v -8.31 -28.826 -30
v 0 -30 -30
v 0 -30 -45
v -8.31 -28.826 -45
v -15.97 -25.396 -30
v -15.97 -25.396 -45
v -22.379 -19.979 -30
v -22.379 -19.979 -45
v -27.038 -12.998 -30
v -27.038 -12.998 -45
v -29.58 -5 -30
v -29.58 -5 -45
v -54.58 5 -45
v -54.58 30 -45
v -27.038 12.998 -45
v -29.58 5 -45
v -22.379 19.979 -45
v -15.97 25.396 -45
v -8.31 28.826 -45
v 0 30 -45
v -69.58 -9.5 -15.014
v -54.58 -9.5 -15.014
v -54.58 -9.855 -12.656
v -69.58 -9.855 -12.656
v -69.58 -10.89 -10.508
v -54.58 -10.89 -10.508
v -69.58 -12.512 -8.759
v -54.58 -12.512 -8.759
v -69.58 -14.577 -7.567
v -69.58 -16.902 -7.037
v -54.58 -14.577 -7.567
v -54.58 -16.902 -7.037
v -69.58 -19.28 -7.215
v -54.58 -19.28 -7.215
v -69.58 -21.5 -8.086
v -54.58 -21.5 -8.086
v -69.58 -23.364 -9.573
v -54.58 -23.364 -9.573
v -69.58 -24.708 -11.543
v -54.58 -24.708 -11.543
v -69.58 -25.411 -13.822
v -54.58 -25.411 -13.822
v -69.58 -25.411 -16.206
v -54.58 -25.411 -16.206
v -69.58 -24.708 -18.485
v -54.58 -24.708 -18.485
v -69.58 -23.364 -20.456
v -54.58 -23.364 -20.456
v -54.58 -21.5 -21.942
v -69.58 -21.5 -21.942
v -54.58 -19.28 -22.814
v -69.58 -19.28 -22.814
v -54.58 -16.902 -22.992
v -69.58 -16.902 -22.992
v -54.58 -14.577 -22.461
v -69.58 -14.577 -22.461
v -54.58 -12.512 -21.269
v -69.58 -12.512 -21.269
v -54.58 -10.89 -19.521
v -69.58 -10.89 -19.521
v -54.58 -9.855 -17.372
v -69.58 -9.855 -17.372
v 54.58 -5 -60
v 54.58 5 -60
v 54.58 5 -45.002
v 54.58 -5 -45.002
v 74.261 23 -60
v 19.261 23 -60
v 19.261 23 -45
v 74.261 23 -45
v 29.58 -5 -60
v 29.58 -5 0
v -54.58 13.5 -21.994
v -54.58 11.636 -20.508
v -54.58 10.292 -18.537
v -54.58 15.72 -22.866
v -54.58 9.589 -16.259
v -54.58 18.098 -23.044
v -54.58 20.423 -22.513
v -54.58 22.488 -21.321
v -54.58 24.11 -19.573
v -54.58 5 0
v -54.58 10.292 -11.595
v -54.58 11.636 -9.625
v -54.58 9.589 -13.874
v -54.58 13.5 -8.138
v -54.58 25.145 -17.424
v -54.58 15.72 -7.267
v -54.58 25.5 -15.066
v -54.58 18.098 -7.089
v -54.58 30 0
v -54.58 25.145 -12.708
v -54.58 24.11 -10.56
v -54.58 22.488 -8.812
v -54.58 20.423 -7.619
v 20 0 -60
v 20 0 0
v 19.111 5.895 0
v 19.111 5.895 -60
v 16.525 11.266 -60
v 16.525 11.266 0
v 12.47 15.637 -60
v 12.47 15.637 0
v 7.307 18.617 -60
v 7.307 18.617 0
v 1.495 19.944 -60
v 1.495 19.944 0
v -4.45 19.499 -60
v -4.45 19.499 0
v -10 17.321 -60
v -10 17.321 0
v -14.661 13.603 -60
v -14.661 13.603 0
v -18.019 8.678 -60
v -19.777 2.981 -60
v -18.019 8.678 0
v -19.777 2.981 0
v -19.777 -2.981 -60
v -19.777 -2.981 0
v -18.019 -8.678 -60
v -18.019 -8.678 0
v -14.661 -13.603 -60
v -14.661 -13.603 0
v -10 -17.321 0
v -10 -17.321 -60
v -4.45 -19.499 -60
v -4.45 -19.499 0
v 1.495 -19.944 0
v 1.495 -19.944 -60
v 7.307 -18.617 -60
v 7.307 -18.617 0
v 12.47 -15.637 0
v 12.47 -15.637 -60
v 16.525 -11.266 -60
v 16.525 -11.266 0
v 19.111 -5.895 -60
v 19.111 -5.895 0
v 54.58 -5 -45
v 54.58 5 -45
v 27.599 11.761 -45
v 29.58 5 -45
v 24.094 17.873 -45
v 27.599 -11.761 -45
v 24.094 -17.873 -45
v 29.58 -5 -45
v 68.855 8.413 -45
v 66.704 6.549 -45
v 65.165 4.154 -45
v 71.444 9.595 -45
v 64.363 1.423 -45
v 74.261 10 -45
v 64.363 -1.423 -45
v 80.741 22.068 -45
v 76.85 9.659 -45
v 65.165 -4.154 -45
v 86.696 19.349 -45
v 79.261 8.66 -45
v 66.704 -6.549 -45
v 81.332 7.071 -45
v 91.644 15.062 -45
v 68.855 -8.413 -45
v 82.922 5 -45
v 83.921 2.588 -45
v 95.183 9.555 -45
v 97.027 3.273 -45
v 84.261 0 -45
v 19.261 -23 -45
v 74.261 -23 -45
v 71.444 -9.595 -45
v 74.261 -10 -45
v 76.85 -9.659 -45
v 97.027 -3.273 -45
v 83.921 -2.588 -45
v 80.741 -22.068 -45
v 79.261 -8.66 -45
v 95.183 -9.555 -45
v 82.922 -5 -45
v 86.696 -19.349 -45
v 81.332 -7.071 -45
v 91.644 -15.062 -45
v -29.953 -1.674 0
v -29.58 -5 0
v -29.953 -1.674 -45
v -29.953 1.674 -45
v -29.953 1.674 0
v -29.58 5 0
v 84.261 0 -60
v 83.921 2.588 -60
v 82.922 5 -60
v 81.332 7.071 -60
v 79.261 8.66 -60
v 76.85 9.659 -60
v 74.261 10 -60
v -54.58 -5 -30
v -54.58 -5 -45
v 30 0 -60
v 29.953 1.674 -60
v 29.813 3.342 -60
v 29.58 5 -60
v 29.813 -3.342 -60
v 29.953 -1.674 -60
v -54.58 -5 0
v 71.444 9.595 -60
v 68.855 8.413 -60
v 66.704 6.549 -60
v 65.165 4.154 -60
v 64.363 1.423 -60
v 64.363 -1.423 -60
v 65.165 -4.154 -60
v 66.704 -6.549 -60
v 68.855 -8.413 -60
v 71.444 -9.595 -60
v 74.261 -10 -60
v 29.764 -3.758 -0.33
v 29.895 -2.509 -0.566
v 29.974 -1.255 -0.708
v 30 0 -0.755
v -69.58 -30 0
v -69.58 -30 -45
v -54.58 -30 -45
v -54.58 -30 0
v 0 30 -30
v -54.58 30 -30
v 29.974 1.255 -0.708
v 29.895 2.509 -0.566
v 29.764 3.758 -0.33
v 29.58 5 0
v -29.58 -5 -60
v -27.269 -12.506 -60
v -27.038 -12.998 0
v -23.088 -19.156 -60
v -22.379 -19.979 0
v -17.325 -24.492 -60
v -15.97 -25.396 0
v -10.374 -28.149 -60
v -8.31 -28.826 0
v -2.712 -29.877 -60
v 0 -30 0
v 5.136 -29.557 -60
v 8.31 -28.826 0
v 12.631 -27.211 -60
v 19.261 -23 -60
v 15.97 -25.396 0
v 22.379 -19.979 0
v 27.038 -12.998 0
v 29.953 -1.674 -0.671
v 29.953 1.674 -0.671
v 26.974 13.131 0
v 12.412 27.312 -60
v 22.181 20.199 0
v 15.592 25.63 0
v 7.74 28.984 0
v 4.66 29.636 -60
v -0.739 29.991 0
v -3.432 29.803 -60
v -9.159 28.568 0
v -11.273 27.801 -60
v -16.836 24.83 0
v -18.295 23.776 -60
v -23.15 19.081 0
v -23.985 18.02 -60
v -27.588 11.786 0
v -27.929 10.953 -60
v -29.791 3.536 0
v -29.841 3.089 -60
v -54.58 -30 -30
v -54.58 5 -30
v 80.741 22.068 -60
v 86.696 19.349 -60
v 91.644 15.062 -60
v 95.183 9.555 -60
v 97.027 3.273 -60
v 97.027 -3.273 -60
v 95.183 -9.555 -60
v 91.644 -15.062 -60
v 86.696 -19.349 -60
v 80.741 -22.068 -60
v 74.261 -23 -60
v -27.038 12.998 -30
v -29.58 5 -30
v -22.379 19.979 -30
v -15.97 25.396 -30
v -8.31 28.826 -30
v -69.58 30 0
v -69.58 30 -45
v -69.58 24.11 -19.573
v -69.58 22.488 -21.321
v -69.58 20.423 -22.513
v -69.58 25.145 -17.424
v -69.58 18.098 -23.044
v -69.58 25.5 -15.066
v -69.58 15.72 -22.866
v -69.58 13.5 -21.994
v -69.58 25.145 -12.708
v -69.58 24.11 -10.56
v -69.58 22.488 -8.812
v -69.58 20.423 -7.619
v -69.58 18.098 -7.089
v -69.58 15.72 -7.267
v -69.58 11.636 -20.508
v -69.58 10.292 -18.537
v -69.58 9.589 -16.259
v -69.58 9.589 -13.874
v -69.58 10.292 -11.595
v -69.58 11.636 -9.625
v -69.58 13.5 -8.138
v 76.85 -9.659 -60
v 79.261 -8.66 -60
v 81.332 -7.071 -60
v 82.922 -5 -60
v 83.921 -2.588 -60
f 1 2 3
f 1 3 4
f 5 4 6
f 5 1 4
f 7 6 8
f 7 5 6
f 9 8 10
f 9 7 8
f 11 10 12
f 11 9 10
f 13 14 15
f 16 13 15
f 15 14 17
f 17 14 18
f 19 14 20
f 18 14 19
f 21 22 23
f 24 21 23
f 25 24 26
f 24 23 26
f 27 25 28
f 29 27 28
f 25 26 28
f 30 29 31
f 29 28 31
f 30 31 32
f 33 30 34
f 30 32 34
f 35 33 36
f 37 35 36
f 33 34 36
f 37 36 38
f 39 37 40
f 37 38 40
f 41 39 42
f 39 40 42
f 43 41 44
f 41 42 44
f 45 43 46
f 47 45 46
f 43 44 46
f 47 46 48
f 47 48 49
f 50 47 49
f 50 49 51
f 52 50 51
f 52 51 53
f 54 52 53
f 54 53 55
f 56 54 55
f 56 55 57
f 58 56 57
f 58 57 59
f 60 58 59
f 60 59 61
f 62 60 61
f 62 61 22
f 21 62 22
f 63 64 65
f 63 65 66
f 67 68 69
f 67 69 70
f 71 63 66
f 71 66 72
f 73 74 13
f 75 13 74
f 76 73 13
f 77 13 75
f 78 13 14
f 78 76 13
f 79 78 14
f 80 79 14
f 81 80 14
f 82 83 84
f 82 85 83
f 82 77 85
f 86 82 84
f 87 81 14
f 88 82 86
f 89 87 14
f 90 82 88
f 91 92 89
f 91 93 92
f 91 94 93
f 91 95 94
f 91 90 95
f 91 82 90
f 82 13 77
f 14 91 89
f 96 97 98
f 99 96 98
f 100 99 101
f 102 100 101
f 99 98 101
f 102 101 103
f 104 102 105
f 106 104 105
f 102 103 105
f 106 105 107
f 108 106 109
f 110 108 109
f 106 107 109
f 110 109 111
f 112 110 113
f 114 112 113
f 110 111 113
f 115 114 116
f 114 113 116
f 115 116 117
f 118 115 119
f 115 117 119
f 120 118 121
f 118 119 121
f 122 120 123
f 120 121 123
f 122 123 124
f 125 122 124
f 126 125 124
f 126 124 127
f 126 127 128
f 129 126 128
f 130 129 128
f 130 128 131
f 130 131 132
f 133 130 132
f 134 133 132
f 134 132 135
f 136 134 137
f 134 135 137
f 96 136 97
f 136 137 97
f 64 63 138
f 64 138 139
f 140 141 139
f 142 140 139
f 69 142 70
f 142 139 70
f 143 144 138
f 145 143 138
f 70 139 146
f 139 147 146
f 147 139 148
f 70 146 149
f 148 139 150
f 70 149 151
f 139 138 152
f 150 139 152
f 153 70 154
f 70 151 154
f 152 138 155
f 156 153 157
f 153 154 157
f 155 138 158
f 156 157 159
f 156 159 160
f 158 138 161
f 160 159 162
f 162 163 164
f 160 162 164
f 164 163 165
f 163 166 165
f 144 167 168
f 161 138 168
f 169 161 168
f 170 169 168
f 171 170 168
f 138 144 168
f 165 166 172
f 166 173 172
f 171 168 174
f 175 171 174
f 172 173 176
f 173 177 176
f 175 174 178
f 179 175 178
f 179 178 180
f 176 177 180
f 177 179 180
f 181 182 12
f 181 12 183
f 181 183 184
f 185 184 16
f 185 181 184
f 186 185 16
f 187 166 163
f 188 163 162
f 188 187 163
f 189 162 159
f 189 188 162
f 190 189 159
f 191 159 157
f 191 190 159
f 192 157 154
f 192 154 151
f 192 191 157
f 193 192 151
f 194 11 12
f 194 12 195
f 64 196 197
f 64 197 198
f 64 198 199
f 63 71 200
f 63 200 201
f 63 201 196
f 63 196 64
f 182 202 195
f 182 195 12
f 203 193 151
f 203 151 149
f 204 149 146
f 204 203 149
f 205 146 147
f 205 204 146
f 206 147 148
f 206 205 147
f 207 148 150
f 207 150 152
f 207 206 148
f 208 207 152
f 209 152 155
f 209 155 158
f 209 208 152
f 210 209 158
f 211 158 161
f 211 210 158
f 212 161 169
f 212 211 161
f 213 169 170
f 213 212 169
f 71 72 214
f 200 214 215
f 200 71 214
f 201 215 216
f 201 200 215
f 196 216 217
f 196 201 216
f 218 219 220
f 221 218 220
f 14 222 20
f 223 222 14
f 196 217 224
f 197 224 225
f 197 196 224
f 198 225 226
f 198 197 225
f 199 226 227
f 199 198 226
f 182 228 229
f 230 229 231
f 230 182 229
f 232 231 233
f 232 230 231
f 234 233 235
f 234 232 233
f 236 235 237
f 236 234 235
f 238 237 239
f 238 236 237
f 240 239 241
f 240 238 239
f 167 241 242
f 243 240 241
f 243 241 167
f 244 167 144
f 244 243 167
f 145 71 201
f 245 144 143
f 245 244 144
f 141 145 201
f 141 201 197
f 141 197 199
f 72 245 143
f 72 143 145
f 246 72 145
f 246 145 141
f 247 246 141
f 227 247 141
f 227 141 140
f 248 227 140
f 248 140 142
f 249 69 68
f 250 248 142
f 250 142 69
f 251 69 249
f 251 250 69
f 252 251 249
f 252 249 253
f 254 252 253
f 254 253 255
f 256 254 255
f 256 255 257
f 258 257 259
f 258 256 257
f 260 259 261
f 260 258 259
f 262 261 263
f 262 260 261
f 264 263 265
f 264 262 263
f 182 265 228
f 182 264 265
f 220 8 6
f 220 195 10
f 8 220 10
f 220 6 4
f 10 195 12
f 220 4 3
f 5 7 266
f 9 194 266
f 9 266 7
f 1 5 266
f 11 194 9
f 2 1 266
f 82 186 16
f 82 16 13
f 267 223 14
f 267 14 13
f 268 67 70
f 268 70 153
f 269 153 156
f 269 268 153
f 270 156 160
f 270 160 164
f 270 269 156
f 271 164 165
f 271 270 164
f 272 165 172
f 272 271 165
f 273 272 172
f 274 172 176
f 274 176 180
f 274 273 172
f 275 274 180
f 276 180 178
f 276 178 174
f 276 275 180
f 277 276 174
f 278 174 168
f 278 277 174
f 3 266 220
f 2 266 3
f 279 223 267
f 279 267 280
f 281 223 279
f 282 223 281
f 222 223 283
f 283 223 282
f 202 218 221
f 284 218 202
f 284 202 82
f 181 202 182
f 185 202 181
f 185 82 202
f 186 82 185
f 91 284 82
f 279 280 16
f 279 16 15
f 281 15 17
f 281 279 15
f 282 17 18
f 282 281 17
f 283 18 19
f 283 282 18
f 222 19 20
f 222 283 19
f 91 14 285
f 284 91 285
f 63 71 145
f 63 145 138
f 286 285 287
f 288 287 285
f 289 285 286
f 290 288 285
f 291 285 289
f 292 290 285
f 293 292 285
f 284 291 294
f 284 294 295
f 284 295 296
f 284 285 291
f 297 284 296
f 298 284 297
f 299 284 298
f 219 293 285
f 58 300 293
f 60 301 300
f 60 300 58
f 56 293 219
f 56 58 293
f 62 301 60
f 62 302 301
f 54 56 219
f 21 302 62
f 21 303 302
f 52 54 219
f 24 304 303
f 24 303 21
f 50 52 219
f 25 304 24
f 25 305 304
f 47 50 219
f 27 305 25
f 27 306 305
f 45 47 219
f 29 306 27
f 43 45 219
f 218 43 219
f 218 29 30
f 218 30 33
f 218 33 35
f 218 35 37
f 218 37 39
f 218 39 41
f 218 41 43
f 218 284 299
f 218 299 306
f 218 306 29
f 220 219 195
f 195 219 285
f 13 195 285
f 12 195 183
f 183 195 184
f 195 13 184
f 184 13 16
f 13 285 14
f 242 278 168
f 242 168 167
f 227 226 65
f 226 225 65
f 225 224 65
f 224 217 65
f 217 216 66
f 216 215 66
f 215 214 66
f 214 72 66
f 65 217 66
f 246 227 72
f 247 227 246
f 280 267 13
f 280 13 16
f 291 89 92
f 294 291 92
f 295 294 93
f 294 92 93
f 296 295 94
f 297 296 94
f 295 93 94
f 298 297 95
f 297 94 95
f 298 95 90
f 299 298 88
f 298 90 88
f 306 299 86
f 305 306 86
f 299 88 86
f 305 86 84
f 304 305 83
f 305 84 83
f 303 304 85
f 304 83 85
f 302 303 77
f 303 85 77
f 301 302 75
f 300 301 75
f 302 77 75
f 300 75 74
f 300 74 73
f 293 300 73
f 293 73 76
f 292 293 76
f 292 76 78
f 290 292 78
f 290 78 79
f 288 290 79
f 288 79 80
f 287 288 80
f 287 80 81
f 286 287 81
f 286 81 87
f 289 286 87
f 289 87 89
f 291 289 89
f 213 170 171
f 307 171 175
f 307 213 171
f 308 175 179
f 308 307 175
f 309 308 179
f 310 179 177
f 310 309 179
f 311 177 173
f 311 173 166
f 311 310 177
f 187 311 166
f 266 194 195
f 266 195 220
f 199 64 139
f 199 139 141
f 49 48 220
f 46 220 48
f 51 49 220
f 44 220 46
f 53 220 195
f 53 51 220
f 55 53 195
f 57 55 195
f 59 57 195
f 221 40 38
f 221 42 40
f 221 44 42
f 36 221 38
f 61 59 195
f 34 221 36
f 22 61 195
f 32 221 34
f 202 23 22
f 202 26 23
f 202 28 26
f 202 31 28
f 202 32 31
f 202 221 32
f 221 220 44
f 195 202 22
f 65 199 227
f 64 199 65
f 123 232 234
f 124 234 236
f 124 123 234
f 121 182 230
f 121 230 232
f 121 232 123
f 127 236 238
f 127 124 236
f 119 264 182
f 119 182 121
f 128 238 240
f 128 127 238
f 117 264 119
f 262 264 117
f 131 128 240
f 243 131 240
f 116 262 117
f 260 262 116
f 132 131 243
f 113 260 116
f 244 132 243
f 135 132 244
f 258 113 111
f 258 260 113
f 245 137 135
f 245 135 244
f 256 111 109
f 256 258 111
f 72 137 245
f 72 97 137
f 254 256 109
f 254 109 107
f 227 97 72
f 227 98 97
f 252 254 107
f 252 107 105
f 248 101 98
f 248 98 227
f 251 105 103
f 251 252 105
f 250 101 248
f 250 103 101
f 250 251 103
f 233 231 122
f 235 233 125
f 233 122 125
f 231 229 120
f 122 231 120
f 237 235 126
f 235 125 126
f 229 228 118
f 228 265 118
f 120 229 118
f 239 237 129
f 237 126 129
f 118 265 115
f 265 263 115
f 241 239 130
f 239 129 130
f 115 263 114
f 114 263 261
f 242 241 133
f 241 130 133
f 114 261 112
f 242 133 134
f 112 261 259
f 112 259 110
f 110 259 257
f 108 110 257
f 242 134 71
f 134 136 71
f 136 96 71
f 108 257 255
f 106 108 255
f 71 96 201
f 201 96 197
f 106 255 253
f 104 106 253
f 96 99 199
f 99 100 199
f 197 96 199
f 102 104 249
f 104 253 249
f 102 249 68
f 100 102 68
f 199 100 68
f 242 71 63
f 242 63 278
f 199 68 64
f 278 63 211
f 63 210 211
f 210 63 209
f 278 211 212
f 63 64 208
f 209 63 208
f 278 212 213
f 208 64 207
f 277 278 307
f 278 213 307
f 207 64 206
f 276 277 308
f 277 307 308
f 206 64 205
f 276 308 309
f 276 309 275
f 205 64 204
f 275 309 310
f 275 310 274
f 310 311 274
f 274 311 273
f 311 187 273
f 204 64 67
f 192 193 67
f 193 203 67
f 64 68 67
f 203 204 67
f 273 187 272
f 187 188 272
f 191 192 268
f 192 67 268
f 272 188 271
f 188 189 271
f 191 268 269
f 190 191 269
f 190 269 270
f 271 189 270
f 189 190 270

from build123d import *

# Parameters (mm, degrees)
F0_R      = 20
F1_DEPTH  = 60
F3_DEPTH  = 45
F4_DEPTH  = 45
F6_DEPTH  = 30
F7_DEPTH  = 30
F8_R      = 8
F9_DEPTH  = 15.001
F11_DEPTH = 15
F12_DEPTH = 60
F14_DEPTH = 10


with BuildPart() as f1:
    # F0 (on Top) → F1 (new body)
    with BuildSketch(Plane.XY):
        with BuildLine():
            ThreePointArc((0, -30), (21.2132034356, -21.2132034356), (30, 0))
            ThreePointArc((30, 0), (21.2132034356, 21.2132034356), (0, 30))
            ThreePointArc((0, 30), (-19.364916731, 22.9128784748), (-29.5803989155, 5))
            ThreePointArc((-29.5803989155, 5), (-30, 0), (-29.5803989155, -5))
            ThreePointArc((-29.5803989155, -5), (-19.364916731, -22.9128784748), (0, -30))
        make_face()
        Circle(F0_R, mode=Mode.SUBTRACT)
    extrude(amount=-F1_DEPTH)

    # F10 (on face) → F11 (join)
    with BuildSketch(Plane(origin=(0, 0, -60), x_dir=(1, 0, 0), z_dir=(0, 0, -1))):
        with BuildLine():
            ThreePointArc((19.2613602843, 23), (26.0265126445, 14.9204771897), (29.5803989155, 5))
            Line((29.5803989155, 5), (54.5803989155, 5))
            Line((54.5803989155, 5), (54.5803989155, -5))
            Line((54.5803989155, -5), (29.5803989155, -5))
            ThreePointArc((29.5803989155, -5), (26.0265126445, -14.9204771897), (19.2613602843, -23))
            Line((19.2613602843, -23), (74.2613602843, -23))
            Line((74.2613602843, -23), (74.2613602843, -10))
            ThreePointArc((74.2613602843, -10), (64.2613602843, 0), (74.2613602843, 10))
            Line((74.2613602843, 10), (74.2613602843, 23))
            Line((74.2613602843, 23), (19.2613602843, 23))
        make_face()
        with BuildLine():
            ThreePointArc((74.2613602843, -23), (97.2613602843, 0), (74.2613602843, 23))
            Line((74.2613602843, 23), (74.2613602843, 10))
            ThreePointArc((74.2613602843, 10), (81.3324280961, 7.0710678119), (84.2613602843, 0))
            ThreePointArc((84.2613602843, 0), (81.3324280961, -7.0710678119), (74.2613602843, -10))
            Line((74.2613602843, -10), (74.2613602843, -23))
        make_face()
    extrude(amount=-F11_DEPTH)


with BuildPart() as f3:
    # F2 (on face) → F3 (new body)
    with BuildSketch(Plane.XY):
        with BuildLine():
            ThreePointArc((-29.5803989155, -5), (-30, 0), (-29.5803989155, 5))
            Line((-29.5803989155, 5), (-54.5803989155, 5))
            Line((-54.5803989155, 5), (-54.5803989155, 30))
            Line((-54.5803989155, 30), (-69.5803989155, 30))
            Line((-69.5803989155, 30), (-69.5803989155, -30))
            Line((-69.5803989155, -30), (-54.5803989155, -30))
            Line((-54.5803989155, -30), (-54.5803989155, -5))
            Line((-54.5803989155, -5), (-29.5803989155, -5))
        make_face()
    extrude(amount=-F3_DEPTH)

    # F8 (on face) → F9 (cut, through all)
    with BuildSketch(Plane.YZ.offset(-54.5803989155)):
        with Locations((-17.5, -15.0141306221)):
            Circle(F8_R)
        with Locations((17.5, -15.0661990047)):
            Circle(F8_R)
    extrude(amount=-F9_DEPTH, mode=Mode.SUBTRACT)


with BuildPart() as f4:
    # F0 (on Top) → F4 (new body)
    with BuildSketch(Plane.XY):
        with BuildLine():
            Line((-54.5803989155, -30), (0, -30))
            ThreePointArc((0, -30), (-19.364916731, -22.9128784748), (-29.5803989155, -5))
            Line((-29.5803989155, -5), (-54.5803989155, -5))
            Line((-54.5803989155, -5), (-54.5803989155, -30))
        make_face()
    extrude(amount=-F4_DEPTH)

    # F5 (on face) → F6 (cut)
    with BuildSketch(Plane.XY):
        with BuildLine():
            Line((-54.5803989155, -30), (0, -30))
            ThreePointArc((0, -30), (-19.364916731, -22.9128784748), (-29.5803989155, -5))
            Line((-29.5803989155, -5), (-54.5803989155, -5))
            Line((-54.5803989155, -5), (-54.5803989155, -30))
        make_face()
    extrude(amount=-F6_DEPTH, mode=Mode.SUBTRACT)


with BuildPart() as f4b:
    # F0 (on Top) → F4, piece 2 (new body)
    with BuildSketch(Plane.XY):
        with BuildLine():
            ThreePointArc((-29.5803989155, 5), (-19.364916731, 22.9128784748), (0, 30))
            Line((0, 30), (-54.5803989155, 30))
            Line((-54.5803989155, 30), (-54.5803989155, 5))
            Line((-54.5803989155, 5), (-29.5803989155, 5))
        make_face()
    extrude(amount=-F4_DEPTH)

    # F7 (cut): a face of the model
    f7_faces = [f4b.faces().sort_by_distance(p)[0] for p in [
        (-37.7554435804, 18.8998422271, 0),
    ]]
    extrude(f7_faces, amount=-F7_DEPTH, mode=Mode.SUBTRACT)


with BuildPart() as f12:
    # F10 (on face) → F12 (new body)
    with BuildSketch(Plane(origin=(0, 0, -60), x_dir=(1, 0, 0), z_dir=(0, 0, -1))):
        with BuildLine():
            Line((54.5803989155, 5), (29.5803989155, 5))
            ThreePointArc((29.5803989155, 5), (29.8949156836, 2.5087878084), (30, 0))
            ThreePointArc((30, 0), (29.8949156836, -2.5087878084), (29.5803989155, -5))
            Line((29.5803989155, -5), (54.5803989155, -5))
            Line((54.5803989155, -5), (54.5803989155, 5))
        make_face()
    extrude(amount=-F12_DEPTH)


with BuildPart() as f14_tool:
    # F13 (on face) → F14 (new body)
    with BuildSketch(Plane.XZ.offset(5)):
        Polygon((54.5803989155, 0), (29.5803989155, 0), (54.5803989155, -45.0015179813), align=None)
    extrude(amount=-F14_DEPTH)


with BuildPart() as f1_1:
    add(f1.part)

    # F14: cut by f14_tool
    add(f14_tool.part, mode=Mode.SUBTRACT)


with BuildPart() as f12_1:
    add(f12.part)

    # F14: cut by f14_tool
    add(f14_tool.part, mode=Mode.SUBTRACT)


solid = Compound([f3.part, f4.part, f4b.part, f1_1.part, f12_1.part])
